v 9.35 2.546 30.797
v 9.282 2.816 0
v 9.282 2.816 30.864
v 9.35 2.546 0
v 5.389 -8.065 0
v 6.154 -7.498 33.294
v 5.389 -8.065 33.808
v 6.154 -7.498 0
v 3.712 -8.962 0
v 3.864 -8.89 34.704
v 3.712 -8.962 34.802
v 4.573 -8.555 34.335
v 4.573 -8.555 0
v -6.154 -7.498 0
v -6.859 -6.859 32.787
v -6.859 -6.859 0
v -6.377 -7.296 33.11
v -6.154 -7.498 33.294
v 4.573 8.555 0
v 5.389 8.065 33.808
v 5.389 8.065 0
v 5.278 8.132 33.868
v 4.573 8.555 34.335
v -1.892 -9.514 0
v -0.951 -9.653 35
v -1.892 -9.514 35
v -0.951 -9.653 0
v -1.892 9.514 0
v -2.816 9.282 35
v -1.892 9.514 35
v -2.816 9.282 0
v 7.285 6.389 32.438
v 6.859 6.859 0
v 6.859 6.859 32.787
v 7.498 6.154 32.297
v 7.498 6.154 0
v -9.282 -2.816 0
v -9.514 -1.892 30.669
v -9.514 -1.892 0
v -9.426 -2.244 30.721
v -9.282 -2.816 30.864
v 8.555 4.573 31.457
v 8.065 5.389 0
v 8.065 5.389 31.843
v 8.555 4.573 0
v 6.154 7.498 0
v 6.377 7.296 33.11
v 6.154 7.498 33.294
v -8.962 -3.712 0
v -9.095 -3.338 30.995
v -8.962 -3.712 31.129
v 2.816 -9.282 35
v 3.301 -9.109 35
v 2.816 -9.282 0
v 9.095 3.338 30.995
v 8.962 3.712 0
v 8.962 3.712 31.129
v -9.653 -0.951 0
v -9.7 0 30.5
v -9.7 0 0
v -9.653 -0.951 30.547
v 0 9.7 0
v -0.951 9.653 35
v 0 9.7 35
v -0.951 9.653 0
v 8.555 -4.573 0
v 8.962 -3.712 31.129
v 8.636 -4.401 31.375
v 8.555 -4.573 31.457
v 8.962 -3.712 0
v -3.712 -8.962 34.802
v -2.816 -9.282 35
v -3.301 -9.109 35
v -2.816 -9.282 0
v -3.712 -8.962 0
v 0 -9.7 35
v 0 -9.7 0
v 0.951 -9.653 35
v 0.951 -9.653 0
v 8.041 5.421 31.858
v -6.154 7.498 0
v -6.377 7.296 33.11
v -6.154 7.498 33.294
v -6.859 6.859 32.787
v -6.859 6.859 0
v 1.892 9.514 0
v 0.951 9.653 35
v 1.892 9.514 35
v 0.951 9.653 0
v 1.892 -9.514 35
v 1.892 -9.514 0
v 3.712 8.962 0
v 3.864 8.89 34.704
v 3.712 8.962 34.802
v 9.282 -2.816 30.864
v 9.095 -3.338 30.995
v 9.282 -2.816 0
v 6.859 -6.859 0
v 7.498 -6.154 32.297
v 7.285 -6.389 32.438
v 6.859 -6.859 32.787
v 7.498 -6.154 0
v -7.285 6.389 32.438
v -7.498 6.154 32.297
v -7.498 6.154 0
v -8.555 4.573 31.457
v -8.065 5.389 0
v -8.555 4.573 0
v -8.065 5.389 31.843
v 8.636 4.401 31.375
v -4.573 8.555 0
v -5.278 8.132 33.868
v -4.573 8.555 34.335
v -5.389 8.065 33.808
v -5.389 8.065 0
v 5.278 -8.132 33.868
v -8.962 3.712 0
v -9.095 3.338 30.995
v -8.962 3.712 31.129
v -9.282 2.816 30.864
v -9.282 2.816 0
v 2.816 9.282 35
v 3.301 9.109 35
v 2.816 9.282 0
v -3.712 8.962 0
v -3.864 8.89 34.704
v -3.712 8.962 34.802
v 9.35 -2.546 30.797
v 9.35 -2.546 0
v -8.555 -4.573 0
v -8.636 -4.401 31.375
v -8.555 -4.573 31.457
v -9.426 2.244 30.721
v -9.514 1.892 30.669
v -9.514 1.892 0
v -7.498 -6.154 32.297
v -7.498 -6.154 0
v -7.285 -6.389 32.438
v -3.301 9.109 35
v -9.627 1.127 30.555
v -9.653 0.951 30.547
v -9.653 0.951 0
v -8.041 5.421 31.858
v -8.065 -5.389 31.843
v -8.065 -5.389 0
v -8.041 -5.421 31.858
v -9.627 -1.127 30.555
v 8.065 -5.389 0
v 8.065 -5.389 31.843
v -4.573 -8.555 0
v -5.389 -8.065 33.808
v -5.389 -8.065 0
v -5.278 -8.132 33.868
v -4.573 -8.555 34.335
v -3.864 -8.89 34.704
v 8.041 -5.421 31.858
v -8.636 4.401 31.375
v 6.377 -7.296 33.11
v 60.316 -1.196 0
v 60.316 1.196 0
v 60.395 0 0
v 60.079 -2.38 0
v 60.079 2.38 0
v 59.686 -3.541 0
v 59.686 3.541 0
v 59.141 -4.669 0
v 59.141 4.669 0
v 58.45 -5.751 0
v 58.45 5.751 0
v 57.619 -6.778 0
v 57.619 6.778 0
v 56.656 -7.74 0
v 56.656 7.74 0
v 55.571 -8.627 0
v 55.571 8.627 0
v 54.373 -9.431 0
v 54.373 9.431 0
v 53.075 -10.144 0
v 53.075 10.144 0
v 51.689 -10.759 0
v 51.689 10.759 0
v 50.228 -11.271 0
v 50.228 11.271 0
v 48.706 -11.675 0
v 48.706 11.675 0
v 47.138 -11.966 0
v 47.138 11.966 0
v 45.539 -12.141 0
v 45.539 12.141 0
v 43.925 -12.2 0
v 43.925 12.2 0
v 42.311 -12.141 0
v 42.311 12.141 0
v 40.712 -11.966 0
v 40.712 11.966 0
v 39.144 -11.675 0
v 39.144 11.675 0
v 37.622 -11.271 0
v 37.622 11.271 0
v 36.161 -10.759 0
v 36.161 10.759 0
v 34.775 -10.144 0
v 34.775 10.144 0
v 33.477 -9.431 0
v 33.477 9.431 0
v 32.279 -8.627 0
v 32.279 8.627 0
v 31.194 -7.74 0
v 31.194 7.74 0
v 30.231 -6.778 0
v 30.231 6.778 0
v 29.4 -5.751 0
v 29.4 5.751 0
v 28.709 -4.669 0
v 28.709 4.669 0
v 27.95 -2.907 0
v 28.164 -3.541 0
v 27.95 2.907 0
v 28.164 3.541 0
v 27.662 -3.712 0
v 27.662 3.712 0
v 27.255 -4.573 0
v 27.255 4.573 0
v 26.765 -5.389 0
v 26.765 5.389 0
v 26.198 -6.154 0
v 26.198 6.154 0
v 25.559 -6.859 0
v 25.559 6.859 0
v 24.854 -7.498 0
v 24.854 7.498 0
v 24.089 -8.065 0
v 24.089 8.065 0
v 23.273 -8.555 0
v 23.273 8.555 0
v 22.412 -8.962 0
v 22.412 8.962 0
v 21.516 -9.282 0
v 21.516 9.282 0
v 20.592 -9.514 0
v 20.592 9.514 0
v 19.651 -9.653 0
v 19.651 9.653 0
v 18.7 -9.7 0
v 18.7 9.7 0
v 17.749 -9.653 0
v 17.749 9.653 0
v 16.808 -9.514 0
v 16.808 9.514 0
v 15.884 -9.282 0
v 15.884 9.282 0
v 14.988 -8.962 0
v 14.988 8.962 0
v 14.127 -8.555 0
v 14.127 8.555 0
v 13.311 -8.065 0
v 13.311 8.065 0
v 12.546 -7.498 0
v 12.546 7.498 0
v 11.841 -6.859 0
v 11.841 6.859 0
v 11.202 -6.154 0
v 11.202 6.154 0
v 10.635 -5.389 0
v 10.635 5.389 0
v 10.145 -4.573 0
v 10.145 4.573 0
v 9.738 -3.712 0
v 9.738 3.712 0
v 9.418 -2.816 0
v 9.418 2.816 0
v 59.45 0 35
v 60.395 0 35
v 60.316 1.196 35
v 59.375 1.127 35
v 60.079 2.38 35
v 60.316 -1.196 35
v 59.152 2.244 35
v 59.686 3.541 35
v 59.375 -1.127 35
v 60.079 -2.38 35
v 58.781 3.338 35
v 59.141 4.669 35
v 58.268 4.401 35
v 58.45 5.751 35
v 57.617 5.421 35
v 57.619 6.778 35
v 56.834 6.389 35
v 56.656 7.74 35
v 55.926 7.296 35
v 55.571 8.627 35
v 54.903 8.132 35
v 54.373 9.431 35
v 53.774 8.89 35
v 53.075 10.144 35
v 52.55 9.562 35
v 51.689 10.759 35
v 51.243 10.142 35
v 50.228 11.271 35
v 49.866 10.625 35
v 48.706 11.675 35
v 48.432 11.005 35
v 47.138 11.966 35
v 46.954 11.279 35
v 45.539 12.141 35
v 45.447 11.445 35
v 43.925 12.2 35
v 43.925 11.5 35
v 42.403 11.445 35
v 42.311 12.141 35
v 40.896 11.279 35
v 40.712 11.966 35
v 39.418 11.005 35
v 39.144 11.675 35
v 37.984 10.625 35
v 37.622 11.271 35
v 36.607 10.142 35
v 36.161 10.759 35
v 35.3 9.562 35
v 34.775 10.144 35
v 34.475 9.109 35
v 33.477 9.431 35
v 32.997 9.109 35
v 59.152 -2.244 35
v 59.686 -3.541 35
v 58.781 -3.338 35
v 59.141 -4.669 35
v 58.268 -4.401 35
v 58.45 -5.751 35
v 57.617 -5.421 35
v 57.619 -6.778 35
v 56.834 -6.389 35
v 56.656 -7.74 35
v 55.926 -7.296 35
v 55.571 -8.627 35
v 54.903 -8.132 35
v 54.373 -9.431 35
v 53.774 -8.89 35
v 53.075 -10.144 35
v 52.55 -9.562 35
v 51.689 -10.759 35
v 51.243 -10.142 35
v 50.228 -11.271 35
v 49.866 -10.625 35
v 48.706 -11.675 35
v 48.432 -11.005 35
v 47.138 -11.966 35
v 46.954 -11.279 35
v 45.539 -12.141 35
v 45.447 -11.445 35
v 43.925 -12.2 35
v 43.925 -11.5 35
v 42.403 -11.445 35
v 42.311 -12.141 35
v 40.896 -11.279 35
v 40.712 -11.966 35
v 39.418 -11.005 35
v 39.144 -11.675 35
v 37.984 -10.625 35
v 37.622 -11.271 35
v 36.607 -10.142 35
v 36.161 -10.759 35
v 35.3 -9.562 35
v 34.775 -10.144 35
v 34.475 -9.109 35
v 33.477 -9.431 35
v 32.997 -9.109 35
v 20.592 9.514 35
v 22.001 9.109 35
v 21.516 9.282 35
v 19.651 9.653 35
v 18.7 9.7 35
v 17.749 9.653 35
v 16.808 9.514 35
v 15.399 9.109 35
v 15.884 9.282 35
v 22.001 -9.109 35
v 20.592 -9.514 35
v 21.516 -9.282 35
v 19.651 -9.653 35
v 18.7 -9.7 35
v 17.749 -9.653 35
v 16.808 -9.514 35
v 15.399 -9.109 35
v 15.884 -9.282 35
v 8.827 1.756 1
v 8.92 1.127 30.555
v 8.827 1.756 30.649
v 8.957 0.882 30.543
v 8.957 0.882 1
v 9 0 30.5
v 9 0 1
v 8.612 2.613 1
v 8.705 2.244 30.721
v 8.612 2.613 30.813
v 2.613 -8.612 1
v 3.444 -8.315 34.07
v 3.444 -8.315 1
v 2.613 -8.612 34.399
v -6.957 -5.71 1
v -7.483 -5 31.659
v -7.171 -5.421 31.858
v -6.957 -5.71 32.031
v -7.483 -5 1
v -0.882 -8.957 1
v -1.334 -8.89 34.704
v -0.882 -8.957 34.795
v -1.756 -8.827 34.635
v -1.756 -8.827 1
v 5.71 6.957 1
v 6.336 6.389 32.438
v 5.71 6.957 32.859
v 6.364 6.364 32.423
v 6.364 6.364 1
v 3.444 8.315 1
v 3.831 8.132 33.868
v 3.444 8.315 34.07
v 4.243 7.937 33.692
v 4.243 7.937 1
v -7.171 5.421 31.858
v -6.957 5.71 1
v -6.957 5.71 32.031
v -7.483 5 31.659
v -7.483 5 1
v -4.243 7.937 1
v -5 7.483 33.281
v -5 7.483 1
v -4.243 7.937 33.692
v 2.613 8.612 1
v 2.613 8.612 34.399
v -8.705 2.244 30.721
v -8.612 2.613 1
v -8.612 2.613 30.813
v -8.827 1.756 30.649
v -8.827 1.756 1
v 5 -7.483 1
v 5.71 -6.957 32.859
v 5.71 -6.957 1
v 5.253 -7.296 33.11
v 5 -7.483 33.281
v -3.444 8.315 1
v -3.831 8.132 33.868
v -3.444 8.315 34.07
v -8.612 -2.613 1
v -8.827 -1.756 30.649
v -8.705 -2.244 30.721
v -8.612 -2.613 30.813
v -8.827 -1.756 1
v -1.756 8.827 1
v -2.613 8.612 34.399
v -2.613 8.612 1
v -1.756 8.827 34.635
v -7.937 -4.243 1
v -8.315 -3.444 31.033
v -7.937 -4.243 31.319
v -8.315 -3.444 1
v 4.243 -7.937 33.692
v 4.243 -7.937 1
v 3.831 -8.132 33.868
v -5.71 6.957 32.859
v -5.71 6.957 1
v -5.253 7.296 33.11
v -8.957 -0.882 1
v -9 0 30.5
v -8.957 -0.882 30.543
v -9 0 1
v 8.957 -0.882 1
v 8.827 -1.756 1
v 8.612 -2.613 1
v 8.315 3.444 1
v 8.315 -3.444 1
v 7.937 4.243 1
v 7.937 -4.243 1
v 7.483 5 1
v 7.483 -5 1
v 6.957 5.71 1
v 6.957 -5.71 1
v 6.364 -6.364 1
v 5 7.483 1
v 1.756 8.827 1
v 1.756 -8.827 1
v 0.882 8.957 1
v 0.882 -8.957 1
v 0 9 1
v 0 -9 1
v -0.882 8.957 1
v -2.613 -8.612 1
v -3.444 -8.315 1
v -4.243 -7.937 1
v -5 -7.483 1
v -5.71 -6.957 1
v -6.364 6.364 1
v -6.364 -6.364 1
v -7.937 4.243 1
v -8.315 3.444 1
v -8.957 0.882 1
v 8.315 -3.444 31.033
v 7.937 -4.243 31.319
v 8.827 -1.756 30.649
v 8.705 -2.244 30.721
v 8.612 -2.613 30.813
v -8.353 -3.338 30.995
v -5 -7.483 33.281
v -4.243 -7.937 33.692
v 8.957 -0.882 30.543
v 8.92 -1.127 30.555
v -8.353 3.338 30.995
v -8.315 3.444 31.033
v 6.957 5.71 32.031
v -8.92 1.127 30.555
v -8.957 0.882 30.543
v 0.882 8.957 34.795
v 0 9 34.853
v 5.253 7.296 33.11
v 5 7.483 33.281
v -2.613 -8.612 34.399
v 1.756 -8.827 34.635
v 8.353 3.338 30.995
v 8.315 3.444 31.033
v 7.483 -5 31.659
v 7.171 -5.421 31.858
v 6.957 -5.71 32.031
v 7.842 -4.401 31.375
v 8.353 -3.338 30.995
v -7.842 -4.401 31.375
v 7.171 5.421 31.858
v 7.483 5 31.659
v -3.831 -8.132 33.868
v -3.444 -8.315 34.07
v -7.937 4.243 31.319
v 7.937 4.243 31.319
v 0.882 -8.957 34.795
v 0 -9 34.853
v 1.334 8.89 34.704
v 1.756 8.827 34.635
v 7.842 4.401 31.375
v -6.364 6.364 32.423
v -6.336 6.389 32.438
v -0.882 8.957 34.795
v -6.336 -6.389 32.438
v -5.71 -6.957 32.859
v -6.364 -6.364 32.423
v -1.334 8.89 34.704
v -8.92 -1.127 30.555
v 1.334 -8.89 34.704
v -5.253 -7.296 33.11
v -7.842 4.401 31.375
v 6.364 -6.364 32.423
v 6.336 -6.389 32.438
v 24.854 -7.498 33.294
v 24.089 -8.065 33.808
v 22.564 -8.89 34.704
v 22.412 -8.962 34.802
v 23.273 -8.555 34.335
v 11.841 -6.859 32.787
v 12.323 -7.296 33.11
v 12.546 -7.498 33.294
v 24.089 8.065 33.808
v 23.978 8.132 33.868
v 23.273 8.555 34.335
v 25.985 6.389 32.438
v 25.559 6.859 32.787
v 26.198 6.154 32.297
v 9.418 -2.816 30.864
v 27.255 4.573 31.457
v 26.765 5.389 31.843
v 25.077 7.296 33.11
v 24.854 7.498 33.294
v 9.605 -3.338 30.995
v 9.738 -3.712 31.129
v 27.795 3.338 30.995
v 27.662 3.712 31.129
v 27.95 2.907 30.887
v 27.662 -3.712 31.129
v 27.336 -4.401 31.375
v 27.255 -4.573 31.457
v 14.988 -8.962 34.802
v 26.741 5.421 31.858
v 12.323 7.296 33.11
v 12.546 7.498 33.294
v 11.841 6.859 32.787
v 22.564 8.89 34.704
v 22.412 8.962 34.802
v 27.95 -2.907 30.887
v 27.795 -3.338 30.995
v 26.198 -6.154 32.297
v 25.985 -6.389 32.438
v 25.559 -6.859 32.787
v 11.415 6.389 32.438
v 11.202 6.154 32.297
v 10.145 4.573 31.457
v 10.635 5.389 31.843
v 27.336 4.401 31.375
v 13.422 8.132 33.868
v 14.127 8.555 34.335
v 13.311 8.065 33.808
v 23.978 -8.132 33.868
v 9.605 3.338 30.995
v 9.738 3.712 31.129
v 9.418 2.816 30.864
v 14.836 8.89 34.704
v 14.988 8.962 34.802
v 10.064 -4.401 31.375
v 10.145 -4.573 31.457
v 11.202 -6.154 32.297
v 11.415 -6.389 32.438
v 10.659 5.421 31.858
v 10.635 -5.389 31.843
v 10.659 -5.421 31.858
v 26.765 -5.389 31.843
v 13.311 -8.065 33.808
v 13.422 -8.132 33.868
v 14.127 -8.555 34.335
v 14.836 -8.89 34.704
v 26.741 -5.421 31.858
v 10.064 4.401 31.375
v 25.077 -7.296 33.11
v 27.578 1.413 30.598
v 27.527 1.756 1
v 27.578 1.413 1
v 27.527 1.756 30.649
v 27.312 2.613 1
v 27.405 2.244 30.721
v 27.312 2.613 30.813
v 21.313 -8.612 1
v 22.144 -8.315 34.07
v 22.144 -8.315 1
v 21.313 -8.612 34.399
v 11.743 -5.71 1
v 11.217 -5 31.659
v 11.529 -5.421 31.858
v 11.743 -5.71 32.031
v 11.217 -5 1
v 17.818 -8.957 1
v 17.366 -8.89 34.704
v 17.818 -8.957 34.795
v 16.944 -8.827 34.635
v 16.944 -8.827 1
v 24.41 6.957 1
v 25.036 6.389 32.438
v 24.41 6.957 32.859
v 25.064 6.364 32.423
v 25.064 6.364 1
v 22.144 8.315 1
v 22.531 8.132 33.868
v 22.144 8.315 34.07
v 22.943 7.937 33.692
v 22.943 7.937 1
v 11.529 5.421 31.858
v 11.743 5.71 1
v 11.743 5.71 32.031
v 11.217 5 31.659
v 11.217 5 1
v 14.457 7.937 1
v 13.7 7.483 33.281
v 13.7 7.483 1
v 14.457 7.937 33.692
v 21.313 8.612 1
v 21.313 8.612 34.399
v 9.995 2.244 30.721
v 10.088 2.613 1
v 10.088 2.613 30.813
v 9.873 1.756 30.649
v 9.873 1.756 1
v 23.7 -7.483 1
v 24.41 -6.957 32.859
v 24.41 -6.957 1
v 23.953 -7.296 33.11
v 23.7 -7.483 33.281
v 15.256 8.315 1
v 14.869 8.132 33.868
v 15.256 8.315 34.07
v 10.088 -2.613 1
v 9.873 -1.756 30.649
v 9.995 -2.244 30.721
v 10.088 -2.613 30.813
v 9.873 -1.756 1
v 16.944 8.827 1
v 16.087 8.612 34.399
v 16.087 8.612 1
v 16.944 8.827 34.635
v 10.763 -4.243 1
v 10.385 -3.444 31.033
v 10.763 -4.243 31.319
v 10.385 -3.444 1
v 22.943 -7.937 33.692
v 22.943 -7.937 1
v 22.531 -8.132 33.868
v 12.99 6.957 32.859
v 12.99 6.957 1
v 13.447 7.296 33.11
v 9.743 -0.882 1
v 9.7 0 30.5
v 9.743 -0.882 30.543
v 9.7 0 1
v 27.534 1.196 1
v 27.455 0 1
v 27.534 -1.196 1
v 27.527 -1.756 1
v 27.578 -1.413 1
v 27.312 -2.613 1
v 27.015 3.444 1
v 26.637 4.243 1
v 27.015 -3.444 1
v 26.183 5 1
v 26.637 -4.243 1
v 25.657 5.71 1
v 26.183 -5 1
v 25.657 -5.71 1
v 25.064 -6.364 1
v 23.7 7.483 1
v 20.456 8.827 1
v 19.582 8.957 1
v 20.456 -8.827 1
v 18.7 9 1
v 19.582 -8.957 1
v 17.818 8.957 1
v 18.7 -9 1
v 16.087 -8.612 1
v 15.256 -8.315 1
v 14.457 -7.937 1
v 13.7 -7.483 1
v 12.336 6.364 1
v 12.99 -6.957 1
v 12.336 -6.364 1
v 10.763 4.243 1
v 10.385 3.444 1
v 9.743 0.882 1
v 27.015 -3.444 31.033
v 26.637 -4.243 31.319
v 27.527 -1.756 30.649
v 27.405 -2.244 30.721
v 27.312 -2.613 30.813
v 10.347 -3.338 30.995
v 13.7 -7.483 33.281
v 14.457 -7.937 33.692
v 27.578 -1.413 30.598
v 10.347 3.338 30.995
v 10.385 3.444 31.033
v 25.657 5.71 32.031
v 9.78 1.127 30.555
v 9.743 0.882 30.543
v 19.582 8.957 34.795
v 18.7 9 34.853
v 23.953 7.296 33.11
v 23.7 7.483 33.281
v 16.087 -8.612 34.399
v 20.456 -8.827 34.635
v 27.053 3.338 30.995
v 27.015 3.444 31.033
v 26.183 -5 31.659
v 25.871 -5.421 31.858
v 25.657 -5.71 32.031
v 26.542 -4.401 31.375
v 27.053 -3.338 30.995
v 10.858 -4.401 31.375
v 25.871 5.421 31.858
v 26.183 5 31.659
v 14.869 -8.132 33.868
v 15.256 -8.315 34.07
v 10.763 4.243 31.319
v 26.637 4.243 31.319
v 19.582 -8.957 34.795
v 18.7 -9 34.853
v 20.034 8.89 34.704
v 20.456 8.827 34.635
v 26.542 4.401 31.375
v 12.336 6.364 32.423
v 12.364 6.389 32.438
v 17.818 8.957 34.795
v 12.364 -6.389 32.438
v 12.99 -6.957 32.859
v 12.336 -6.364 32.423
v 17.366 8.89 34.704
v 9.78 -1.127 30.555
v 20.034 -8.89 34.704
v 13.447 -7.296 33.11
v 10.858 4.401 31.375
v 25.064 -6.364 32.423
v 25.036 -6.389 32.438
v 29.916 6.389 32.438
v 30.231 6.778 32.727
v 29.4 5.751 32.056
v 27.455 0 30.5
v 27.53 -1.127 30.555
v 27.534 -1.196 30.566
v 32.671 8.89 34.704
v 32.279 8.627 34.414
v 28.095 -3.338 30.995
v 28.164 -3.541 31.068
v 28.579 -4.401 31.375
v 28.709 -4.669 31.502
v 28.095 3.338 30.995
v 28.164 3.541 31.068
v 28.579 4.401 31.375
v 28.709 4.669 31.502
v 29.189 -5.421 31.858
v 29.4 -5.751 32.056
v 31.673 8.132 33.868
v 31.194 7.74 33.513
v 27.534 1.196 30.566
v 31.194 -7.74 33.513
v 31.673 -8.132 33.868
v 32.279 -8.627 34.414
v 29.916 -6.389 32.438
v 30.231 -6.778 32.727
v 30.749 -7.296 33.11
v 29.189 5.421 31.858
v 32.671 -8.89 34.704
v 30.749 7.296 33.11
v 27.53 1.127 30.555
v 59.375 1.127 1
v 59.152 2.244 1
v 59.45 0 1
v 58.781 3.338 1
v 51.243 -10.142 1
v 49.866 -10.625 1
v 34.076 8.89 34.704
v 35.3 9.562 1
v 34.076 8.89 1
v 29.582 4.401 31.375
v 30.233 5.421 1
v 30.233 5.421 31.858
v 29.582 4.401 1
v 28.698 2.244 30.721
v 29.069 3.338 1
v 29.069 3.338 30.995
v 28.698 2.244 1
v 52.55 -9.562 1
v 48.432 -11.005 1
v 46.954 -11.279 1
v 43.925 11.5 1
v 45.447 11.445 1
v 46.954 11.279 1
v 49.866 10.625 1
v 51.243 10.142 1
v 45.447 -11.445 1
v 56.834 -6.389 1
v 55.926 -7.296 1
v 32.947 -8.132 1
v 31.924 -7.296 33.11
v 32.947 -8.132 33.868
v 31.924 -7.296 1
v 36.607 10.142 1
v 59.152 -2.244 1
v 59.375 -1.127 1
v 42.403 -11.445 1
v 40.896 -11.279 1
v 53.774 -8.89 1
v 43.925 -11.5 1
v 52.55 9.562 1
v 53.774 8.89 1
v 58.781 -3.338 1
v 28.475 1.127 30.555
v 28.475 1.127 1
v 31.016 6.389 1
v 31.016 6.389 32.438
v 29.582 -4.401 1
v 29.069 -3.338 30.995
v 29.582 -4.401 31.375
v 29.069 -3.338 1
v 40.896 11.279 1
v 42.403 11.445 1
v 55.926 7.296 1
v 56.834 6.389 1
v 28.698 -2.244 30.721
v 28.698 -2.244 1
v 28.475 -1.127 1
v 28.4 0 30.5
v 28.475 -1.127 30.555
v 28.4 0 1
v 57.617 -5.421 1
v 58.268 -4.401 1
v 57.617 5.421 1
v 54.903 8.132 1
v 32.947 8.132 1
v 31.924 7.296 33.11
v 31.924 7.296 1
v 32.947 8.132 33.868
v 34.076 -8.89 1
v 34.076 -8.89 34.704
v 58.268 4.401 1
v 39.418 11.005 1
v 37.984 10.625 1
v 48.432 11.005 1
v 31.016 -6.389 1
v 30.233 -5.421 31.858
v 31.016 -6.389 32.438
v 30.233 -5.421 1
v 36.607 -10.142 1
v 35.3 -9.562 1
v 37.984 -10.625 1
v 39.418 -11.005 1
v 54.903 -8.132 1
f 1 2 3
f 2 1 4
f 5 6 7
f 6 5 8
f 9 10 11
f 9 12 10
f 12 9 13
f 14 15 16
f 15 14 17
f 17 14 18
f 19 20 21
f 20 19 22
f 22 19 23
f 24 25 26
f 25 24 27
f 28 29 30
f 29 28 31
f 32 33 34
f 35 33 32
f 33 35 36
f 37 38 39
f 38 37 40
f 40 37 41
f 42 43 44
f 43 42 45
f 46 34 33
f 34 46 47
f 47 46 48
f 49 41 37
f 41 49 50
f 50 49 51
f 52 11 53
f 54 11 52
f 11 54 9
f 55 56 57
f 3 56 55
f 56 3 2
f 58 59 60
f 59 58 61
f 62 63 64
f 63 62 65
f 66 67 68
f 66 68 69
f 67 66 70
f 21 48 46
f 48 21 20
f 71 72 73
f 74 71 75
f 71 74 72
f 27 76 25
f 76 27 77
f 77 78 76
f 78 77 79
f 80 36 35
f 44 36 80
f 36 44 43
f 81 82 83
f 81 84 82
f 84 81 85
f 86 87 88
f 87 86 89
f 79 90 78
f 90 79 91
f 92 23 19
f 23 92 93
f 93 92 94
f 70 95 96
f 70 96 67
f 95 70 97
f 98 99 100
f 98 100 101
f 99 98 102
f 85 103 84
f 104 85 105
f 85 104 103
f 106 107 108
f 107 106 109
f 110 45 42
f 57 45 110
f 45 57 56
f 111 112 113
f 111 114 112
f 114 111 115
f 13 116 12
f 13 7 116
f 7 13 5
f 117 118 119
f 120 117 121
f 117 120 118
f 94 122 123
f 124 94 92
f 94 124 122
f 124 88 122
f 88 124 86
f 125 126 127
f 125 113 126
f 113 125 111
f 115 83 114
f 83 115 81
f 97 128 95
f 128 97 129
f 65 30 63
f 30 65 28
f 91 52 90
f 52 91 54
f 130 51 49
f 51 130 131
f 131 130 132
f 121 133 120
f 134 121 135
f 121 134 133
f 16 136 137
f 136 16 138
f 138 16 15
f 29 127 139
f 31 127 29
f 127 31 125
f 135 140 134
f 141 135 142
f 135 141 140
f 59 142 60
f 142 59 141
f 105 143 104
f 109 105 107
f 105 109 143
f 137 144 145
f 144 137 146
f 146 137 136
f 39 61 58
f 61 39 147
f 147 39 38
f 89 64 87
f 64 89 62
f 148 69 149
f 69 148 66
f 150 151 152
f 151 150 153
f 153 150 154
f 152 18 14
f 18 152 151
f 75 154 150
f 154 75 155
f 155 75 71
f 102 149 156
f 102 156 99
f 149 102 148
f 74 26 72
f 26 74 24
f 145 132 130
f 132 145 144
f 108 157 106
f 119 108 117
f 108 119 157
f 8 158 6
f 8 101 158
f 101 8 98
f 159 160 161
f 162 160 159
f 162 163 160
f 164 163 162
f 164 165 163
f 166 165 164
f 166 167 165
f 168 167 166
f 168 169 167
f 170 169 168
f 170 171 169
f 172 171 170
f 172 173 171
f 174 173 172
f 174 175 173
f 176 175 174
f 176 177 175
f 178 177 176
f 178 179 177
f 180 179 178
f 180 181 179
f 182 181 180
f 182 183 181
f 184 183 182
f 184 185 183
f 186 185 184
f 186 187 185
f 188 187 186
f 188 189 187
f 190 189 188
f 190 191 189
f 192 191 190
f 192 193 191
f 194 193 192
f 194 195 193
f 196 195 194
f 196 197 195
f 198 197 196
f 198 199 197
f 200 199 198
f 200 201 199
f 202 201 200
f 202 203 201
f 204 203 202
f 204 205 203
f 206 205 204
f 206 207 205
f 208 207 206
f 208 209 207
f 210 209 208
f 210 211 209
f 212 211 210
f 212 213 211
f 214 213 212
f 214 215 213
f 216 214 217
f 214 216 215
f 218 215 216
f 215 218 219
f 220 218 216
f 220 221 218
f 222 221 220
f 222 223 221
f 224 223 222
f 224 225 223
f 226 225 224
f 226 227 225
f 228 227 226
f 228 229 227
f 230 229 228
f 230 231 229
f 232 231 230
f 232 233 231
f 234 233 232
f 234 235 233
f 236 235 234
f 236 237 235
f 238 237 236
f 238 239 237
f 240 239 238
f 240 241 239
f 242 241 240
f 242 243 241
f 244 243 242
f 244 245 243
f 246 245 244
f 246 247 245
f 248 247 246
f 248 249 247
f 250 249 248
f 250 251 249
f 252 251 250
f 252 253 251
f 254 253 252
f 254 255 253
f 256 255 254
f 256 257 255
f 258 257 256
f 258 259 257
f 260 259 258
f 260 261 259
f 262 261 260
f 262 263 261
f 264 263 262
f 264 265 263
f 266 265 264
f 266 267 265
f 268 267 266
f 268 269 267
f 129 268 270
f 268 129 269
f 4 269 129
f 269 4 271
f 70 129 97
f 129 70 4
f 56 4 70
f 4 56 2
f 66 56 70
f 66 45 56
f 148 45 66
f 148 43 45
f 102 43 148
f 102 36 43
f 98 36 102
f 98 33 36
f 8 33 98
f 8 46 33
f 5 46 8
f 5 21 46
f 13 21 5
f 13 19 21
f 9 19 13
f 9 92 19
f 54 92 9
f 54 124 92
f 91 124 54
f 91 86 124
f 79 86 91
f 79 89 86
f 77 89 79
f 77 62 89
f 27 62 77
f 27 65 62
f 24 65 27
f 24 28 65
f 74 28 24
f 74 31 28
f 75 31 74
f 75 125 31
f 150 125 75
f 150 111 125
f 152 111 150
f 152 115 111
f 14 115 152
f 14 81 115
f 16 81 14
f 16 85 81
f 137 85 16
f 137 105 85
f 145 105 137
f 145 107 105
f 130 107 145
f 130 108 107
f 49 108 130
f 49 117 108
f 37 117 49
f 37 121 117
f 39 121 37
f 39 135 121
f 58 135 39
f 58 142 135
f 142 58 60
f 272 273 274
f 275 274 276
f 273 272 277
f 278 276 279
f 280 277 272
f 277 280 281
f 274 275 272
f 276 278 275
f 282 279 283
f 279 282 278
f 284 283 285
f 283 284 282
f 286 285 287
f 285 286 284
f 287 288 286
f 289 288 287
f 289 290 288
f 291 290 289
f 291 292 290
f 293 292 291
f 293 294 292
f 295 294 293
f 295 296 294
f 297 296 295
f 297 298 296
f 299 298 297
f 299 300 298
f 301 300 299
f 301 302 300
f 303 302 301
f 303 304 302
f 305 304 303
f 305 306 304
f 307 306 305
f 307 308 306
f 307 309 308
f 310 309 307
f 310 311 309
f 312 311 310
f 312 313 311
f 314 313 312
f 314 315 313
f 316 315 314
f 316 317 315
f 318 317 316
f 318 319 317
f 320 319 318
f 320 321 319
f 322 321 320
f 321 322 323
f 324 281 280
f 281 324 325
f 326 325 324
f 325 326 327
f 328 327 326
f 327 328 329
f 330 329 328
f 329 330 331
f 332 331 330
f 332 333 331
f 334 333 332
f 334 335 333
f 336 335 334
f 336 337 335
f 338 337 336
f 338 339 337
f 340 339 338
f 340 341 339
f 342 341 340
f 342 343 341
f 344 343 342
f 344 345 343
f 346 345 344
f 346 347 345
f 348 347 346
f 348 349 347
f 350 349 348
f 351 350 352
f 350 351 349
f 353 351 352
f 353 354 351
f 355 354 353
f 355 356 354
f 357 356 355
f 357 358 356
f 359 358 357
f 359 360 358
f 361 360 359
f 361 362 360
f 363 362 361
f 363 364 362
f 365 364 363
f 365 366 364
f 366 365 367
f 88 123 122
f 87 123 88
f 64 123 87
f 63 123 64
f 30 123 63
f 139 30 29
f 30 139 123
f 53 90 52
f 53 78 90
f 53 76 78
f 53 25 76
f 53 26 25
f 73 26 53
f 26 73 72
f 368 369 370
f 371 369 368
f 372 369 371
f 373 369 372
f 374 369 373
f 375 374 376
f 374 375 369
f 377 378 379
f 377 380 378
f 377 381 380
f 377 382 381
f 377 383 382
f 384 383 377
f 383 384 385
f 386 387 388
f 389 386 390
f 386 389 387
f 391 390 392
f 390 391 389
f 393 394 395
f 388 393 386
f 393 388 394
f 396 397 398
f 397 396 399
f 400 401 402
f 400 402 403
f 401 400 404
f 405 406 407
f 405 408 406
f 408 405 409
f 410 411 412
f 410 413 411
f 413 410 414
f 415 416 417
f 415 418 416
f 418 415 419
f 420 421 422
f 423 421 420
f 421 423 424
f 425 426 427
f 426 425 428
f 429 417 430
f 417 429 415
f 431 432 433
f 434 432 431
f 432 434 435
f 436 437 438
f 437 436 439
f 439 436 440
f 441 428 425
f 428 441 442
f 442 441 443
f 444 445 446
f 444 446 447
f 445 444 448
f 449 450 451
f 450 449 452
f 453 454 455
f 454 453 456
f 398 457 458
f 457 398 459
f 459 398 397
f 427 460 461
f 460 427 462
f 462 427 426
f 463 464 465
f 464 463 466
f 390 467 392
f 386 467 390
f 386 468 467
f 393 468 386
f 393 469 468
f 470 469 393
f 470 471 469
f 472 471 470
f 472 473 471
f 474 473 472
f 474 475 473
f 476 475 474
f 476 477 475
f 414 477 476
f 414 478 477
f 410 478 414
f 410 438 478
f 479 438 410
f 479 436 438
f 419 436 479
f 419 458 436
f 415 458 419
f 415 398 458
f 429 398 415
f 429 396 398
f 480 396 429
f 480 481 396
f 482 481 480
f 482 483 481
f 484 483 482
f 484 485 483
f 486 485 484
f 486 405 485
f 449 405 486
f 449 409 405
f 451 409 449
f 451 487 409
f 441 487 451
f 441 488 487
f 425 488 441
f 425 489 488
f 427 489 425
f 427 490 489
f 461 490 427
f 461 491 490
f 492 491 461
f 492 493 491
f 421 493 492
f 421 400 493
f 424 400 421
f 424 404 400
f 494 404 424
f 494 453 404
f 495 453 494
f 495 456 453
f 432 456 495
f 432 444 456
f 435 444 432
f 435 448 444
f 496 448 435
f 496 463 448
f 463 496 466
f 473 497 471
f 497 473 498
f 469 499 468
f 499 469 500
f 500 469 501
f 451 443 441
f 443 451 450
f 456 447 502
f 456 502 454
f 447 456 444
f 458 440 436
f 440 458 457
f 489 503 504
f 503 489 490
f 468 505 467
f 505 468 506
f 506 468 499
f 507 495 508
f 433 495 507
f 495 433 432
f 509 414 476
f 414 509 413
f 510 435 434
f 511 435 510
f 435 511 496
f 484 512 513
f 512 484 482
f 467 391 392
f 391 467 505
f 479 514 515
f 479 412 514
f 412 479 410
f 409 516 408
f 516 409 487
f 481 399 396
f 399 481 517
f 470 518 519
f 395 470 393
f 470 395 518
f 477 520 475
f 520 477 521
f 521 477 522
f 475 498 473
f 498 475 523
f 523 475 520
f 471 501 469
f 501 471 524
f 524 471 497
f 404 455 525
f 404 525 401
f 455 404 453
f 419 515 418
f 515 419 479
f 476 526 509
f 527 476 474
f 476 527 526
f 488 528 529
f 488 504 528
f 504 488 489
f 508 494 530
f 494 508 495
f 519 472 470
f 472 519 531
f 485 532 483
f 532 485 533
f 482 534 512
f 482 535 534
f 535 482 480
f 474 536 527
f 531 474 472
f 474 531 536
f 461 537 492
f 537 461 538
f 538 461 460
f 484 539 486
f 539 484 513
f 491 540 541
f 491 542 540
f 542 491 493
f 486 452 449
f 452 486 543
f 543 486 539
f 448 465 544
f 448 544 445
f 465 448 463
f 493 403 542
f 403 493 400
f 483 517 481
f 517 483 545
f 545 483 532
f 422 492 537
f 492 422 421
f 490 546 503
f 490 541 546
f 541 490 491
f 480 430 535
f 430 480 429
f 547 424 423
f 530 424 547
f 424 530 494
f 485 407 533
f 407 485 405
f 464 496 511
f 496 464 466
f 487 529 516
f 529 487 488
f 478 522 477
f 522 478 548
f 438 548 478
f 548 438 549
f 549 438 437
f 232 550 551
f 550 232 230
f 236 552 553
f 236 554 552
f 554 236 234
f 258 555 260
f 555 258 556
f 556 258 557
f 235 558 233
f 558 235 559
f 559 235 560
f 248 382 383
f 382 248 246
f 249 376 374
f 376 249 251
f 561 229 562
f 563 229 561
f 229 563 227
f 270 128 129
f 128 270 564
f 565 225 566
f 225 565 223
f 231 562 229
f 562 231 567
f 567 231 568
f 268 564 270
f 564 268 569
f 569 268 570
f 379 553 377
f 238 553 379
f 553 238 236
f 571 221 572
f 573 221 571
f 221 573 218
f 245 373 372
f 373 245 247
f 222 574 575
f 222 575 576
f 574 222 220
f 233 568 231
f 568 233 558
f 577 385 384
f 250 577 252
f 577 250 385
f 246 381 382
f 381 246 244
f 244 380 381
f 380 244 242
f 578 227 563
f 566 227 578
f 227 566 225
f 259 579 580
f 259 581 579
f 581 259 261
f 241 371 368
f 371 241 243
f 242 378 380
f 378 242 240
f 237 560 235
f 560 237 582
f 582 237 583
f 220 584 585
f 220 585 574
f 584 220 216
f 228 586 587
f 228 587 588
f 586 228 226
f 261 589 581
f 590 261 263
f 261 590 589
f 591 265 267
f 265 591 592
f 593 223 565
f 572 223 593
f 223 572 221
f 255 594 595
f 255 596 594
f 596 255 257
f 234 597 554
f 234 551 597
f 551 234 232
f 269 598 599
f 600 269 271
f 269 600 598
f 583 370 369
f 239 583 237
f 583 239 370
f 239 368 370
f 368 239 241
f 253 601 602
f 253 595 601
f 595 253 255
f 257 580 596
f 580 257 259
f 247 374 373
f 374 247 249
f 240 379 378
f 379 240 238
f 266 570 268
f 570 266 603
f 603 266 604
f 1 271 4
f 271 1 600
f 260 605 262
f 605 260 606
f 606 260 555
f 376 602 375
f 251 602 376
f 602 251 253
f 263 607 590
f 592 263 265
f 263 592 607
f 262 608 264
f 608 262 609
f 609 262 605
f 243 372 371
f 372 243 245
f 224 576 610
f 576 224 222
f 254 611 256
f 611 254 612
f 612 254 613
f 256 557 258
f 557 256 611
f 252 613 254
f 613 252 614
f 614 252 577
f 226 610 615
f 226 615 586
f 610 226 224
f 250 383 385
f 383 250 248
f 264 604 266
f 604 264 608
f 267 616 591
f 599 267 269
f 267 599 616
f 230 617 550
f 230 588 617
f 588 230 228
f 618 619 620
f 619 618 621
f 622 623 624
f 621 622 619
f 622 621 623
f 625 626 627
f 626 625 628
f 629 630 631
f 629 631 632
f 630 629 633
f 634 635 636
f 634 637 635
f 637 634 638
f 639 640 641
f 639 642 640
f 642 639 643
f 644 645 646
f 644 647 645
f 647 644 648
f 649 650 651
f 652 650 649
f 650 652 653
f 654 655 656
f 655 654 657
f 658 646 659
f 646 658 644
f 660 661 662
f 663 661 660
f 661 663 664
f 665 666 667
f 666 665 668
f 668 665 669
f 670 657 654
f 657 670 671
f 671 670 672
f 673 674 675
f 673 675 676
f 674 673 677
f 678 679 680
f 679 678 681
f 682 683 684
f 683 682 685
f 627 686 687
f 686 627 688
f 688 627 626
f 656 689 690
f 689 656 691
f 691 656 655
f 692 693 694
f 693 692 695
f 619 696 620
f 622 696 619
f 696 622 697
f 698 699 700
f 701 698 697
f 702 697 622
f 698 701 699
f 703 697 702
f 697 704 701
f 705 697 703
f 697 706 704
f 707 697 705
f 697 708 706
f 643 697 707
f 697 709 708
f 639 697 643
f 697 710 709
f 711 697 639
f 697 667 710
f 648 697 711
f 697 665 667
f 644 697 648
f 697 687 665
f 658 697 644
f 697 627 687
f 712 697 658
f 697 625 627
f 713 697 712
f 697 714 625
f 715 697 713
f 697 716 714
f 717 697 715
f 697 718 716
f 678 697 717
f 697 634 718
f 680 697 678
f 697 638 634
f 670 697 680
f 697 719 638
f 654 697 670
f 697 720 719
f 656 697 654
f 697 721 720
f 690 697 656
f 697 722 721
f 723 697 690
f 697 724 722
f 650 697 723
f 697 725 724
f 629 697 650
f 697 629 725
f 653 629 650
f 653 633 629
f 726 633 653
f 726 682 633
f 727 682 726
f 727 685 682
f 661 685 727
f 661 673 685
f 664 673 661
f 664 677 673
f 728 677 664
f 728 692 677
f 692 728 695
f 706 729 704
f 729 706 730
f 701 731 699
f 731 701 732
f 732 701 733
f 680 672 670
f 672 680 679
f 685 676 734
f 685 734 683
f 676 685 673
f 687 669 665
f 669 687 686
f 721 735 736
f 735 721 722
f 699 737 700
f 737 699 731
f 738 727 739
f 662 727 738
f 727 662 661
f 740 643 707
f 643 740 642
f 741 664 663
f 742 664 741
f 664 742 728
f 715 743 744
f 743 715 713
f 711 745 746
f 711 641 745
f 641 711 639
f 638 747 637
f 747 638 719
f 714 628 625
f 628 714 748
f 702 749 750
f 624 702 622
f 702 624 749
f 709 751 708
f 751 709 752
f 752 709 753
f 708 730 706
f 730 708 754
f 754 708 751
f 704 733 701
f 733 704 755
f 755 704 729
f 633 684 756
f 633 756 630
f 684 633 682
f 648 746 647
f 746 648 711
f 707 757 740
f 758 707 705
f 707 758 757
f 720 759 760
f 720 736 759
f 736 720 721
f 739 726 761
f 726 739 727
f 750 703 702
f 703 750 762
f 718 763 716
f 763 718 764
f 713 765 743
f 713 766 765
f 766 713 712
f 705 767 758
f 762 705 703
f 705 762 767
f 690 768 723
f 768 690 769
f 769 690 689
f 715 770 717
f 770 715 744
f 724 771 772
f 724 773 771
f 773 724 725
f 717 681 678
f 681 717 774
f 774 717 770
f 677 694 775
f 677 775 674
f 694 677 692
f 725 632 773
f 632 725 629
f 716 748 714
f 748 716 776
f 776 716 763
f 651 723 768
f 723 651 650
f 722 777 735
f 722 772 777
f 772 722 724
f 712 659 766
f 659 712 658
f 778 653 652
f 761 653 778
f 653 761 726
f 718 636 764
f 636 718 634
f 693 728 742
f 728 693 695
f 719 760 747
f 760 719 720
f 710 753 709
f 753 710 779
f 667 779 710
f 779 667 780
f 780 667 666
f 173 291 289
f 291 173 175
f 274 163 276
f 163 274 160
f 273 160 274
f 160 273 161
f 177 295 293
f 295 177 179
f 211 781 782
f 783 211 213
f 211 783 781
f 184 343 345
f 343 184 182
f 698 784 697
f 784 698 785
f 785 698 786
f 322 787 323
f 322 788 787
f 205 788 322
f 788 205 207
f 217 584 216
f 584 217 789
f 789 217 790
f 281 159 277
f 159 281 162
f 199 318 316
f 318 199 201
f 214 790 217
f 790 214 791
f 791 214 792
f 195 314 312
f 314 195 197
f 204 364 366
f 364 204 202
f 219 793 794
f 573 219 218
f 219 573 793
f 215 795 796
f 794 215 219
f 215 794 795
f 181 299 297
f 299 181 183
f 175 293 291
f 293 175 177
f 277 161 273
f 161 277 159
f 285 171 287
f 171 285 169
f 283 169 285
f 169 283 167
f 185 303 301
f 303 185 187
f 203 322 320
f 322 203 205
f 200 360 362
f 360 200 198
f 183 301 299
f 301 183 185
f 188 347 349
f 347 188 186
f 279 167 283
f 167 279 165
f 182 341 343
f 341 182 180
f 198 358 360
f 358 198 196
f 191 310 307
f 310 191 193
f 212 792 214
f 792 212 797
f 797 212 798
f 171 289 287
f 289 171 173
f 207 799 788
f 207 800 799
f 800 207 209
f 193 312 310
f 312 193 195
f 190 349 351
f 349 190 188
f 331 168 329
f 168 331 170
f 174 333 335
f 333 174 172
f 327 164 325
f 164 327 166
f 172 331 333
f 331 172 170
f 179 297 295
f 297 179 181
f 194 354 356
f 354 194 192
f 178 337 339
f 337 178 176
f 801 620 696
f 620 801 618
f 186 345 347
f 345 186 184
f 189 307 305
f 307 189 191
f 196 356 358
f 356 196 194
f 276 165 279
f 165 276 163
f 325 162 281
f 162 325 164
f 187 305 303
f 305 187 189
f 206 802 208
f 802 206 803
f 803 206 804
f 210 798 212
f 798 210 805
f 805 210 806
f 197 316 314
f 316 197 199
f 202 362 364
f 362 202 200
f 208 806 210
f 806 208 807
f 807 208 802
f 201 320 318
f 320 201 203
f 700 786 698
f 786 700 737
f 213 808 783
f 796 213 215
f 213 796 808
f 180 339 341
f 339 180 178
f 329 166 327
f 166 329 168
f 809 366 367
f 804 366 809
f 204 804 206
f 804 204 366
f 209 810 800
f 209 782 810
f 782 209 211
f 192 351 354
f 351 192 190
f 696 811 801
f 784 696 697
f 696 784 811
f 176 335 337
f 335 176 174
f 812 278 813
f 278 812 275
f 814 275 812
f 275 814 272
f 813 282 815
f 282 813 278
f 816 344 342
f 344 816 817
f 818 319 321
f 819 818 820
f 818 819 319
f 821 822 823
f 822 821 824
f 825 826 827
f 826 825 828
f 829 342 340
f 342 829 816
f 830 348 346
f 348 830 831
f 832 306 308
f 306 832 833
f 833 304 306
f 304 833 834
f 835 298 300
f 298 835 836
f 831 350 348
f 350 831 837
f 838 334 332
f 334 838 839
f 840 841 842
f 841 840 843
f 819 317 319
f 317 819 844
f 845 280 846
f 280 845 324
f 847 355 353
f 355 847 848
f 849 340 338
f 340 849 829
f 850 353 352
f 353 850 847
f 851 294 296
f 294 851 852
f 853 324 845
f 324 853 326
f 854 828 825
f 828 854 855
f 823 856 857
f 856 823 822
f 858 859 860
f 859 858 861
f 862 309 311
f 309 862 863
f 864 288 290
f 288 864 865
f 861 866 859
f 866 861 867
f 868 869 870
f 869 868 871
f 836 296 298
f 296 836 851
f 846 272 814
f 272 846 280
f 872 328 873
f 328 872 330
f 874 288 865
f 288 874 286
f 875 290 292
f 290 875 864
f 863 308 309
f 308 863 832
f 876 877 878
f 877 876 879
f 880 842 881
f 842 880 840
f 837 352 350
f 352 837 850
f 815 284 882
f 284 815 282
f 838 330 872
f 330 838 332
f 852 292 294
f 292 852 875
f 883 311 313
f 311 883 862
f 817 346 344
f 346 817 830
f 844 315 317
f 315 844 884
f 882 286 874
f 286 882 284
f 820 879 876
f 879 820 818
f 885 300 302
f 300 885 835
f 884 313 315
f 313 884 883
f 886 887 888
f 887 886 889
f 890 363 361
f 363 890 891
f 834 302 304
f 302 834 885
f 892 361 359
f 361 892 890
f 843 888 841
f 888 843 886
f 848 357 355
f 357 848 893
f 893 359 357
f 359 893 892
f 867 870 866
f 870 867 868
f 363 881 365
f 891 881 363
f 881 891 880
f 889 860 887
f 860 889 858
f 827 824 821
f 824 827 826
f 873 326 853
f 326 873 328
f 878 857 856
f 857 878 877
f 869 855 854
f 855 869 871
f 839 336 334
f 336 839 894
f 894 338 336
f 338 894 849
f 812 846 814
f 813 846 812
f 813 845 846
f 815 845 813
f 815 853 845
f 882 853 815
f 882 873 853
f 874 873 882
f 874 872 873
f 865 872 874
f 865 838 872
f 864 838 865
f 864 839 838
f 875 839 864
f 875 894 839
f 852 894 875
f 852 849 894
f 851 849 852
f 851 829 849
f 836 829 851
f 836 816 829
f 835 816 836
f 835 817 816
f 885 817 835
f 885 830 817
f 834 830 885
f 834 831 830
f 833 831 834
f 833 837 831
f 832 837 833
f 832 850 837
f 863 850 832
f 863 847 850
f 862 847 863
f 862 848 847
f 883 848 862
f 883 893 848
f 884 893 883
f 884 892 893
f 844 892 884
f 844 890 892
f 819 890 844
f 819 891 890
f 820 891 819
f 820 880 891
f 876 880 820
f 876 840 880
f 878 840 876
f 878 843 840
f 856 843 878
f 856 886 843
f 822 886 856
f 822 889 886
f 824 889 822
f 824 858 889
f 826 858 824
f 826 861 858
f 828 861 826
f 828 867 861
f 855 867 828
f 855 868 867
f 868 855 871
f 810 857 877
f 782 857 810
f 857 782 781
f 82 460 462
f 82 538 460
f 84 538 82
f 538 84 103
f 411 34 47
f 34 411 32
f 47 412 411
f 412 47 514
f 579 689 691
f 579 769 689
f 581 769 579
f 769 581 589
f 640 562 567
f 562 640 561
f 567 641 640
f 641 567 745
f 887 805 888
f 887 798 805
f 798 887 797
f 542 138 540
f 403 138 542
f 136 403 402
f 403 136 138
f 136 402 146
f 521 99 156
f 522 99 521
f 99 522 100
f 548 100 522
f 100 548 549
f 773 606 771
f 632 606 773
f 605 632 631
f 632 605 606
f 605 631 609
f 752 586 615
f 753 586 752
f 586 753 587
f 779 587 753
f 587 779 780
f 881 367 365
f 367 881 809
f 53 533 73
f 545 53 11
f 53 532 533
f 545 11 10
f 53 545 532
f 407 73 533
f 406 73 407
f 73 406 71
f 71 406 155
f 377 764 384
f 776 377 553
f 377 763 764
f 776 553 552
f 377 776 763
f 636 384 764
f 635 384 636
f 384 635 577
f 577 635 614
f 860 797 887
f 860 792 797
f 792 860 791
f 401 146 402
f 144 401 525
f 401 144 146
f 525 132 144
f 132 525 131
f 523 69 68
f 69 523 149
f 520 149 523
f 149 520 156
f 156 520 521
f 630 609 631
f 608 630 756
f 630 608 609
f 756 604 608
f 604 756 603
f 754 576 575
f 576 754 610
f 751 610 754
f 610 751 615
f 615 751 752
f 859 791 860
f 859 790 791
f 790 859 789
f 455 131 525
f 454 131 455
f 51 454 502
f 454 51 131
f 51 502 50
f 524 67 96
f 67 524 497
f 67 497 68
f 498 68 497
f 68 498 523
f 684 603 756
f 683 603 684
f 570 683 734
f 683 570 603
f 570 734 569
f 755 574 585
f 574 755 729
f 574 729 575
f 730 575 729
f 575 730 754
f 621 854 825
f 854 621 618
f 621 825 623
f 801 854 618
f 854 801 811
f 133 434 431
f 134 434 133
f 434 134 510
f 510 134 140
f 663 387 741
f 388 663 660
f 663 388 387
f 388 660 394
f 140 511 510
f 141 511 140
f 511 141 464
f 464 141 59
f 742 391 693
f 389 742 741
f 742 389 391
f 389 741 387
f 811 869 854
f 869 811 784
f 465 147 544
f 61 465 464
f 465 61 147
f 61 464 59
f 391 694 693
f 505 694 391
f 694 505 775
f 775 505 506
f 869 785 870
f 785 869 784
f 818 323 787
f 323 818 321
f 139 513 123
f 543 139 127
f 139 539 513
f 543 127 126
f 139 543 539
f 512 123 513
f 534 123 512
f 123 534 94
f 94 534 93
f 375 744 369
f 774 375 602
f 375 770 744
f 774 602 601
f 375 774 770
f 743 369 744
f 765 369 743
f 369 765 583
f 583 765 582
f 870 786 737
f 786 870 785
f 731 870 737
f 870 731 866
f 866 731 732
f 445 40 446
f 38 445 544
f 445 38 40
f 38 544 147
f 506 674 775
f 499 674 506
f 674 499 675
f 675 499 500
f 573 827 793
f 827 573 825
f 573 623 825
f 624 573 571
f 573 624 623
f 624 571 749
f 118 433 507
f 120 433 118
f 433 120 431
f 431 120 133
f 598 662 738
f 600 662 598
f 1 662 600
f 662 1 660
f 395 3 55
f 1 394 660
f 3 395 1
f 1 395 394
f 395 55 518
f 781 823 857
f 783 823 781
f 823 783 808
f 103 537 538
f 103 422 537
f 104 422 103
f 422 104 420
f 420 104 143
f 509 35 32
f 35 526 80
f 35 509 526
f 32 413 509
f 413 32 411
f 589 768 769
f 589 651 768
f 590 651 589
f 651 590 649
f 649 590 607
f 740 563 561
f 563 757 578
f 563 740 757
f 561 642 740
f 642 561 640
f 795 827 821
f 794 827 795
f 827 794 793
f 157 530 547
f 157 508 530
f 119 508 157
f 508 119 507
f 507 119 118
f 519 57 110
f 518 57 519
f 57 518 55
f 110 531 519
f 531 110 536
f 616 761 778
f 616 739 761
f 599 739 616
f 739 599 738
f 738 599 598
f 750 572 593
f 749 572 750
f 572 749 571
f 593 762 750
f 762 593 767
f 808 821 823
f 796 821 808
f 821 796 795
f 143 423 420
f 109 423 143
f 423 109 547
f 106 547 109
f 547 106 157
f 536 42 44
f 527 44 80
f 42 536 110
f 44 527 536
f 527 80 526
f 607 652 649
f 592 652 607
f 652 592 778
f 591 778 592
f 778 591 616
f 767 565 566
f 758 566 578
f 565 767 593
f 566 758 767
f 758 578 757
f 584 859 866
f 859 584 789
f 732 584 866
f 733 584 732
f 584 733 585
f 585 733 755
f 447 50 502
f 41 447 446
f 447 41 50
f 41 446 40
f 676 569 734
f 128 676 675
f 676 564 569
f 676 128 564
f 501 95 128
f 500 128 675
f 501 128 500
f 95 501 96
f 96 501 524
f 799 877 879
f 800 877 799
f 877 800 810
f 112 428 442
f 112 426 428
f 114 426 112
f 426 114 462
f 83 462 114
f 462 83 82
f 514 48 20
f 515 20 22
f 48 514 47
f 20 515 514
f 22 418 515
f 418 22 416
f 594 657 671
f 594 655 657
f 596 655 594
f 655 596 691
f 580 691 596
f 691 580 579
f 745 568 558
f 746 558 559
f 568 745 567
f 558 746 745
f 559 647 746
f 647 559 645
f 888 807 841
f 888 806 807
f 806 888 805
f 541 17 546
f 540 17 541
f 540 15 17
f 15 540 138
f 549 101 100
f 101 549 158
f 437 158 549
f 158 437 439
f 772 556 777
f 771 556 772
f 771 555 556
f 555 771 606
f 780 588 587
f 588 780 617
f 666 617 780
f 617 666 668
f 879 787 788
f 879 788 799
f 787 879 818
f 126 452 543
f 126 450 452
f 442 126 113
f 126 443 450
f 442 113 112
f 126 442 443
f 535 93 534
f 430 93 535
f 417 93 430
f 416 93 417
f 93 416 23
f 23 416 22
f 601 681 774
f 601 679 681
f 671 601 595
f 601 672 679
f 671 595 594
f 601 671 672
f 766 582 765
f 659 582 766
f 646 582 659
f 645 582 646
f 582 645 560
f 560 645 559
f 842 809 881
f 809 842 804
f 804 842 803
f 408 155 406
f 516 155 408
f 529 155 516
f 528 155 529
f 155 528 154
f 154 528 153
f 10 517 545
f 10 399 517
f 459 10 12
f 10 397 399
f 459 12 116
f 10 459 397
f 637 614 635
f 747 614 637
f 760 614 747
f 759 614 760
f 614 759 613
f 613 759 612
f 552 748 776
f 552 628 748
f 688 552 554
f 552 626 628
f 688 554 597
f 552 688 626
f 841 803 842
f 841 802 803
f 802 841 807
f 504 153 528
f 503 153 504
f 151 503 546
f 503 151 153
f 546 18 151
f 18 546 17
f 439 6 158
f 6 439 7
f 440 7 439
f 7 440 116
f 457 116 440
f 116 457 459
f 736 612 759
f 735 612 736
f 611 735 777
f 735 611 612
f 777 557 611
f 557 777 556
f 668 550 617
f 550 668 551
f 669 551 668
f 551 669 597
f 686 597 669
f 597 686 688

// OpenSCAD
toeSize = 18;
bigToeSize = 23;
length = 35;
t = 0.7;
pad=1;
angle = 0;
$fn=64;

module toe(size) {
	difference() {
		cylinder(r=size/2+t, h=length);
		translate([0,0,pad]) cylinder(r=size/2, h=length);
		}
	}

module toeDis() {
	 rotate([0,-angle,0]) toe(toeSize);
	 translate([toeSize+t,0,0])  rotate([0,-angle,0]) toe(toeSize);
	 translate([1.5*toeSize+1.35*bigToeSize/2+2*t,0,0]) rotate([0,-angle,0]) scale([1.35,1,1]) toe(bigToeSize);
	cubeX = toeSize*2+1.25*bigToeSize+4*t;
	cubeY = bigToeSize+2*t;
	//translate([-toeSize/2-t,-bigToeSize/2-t,0])	cube([cubeX,cubeY,1]);
	}

difference() {
	toeDis();
	//translate([-100,-100,-100+2.6]) cube([200,200,100]);
	translate([-20,0,length+7]) rotate([0,90-angle,0]) cylinder(h=70,r=bigToeSize/2);
	}
